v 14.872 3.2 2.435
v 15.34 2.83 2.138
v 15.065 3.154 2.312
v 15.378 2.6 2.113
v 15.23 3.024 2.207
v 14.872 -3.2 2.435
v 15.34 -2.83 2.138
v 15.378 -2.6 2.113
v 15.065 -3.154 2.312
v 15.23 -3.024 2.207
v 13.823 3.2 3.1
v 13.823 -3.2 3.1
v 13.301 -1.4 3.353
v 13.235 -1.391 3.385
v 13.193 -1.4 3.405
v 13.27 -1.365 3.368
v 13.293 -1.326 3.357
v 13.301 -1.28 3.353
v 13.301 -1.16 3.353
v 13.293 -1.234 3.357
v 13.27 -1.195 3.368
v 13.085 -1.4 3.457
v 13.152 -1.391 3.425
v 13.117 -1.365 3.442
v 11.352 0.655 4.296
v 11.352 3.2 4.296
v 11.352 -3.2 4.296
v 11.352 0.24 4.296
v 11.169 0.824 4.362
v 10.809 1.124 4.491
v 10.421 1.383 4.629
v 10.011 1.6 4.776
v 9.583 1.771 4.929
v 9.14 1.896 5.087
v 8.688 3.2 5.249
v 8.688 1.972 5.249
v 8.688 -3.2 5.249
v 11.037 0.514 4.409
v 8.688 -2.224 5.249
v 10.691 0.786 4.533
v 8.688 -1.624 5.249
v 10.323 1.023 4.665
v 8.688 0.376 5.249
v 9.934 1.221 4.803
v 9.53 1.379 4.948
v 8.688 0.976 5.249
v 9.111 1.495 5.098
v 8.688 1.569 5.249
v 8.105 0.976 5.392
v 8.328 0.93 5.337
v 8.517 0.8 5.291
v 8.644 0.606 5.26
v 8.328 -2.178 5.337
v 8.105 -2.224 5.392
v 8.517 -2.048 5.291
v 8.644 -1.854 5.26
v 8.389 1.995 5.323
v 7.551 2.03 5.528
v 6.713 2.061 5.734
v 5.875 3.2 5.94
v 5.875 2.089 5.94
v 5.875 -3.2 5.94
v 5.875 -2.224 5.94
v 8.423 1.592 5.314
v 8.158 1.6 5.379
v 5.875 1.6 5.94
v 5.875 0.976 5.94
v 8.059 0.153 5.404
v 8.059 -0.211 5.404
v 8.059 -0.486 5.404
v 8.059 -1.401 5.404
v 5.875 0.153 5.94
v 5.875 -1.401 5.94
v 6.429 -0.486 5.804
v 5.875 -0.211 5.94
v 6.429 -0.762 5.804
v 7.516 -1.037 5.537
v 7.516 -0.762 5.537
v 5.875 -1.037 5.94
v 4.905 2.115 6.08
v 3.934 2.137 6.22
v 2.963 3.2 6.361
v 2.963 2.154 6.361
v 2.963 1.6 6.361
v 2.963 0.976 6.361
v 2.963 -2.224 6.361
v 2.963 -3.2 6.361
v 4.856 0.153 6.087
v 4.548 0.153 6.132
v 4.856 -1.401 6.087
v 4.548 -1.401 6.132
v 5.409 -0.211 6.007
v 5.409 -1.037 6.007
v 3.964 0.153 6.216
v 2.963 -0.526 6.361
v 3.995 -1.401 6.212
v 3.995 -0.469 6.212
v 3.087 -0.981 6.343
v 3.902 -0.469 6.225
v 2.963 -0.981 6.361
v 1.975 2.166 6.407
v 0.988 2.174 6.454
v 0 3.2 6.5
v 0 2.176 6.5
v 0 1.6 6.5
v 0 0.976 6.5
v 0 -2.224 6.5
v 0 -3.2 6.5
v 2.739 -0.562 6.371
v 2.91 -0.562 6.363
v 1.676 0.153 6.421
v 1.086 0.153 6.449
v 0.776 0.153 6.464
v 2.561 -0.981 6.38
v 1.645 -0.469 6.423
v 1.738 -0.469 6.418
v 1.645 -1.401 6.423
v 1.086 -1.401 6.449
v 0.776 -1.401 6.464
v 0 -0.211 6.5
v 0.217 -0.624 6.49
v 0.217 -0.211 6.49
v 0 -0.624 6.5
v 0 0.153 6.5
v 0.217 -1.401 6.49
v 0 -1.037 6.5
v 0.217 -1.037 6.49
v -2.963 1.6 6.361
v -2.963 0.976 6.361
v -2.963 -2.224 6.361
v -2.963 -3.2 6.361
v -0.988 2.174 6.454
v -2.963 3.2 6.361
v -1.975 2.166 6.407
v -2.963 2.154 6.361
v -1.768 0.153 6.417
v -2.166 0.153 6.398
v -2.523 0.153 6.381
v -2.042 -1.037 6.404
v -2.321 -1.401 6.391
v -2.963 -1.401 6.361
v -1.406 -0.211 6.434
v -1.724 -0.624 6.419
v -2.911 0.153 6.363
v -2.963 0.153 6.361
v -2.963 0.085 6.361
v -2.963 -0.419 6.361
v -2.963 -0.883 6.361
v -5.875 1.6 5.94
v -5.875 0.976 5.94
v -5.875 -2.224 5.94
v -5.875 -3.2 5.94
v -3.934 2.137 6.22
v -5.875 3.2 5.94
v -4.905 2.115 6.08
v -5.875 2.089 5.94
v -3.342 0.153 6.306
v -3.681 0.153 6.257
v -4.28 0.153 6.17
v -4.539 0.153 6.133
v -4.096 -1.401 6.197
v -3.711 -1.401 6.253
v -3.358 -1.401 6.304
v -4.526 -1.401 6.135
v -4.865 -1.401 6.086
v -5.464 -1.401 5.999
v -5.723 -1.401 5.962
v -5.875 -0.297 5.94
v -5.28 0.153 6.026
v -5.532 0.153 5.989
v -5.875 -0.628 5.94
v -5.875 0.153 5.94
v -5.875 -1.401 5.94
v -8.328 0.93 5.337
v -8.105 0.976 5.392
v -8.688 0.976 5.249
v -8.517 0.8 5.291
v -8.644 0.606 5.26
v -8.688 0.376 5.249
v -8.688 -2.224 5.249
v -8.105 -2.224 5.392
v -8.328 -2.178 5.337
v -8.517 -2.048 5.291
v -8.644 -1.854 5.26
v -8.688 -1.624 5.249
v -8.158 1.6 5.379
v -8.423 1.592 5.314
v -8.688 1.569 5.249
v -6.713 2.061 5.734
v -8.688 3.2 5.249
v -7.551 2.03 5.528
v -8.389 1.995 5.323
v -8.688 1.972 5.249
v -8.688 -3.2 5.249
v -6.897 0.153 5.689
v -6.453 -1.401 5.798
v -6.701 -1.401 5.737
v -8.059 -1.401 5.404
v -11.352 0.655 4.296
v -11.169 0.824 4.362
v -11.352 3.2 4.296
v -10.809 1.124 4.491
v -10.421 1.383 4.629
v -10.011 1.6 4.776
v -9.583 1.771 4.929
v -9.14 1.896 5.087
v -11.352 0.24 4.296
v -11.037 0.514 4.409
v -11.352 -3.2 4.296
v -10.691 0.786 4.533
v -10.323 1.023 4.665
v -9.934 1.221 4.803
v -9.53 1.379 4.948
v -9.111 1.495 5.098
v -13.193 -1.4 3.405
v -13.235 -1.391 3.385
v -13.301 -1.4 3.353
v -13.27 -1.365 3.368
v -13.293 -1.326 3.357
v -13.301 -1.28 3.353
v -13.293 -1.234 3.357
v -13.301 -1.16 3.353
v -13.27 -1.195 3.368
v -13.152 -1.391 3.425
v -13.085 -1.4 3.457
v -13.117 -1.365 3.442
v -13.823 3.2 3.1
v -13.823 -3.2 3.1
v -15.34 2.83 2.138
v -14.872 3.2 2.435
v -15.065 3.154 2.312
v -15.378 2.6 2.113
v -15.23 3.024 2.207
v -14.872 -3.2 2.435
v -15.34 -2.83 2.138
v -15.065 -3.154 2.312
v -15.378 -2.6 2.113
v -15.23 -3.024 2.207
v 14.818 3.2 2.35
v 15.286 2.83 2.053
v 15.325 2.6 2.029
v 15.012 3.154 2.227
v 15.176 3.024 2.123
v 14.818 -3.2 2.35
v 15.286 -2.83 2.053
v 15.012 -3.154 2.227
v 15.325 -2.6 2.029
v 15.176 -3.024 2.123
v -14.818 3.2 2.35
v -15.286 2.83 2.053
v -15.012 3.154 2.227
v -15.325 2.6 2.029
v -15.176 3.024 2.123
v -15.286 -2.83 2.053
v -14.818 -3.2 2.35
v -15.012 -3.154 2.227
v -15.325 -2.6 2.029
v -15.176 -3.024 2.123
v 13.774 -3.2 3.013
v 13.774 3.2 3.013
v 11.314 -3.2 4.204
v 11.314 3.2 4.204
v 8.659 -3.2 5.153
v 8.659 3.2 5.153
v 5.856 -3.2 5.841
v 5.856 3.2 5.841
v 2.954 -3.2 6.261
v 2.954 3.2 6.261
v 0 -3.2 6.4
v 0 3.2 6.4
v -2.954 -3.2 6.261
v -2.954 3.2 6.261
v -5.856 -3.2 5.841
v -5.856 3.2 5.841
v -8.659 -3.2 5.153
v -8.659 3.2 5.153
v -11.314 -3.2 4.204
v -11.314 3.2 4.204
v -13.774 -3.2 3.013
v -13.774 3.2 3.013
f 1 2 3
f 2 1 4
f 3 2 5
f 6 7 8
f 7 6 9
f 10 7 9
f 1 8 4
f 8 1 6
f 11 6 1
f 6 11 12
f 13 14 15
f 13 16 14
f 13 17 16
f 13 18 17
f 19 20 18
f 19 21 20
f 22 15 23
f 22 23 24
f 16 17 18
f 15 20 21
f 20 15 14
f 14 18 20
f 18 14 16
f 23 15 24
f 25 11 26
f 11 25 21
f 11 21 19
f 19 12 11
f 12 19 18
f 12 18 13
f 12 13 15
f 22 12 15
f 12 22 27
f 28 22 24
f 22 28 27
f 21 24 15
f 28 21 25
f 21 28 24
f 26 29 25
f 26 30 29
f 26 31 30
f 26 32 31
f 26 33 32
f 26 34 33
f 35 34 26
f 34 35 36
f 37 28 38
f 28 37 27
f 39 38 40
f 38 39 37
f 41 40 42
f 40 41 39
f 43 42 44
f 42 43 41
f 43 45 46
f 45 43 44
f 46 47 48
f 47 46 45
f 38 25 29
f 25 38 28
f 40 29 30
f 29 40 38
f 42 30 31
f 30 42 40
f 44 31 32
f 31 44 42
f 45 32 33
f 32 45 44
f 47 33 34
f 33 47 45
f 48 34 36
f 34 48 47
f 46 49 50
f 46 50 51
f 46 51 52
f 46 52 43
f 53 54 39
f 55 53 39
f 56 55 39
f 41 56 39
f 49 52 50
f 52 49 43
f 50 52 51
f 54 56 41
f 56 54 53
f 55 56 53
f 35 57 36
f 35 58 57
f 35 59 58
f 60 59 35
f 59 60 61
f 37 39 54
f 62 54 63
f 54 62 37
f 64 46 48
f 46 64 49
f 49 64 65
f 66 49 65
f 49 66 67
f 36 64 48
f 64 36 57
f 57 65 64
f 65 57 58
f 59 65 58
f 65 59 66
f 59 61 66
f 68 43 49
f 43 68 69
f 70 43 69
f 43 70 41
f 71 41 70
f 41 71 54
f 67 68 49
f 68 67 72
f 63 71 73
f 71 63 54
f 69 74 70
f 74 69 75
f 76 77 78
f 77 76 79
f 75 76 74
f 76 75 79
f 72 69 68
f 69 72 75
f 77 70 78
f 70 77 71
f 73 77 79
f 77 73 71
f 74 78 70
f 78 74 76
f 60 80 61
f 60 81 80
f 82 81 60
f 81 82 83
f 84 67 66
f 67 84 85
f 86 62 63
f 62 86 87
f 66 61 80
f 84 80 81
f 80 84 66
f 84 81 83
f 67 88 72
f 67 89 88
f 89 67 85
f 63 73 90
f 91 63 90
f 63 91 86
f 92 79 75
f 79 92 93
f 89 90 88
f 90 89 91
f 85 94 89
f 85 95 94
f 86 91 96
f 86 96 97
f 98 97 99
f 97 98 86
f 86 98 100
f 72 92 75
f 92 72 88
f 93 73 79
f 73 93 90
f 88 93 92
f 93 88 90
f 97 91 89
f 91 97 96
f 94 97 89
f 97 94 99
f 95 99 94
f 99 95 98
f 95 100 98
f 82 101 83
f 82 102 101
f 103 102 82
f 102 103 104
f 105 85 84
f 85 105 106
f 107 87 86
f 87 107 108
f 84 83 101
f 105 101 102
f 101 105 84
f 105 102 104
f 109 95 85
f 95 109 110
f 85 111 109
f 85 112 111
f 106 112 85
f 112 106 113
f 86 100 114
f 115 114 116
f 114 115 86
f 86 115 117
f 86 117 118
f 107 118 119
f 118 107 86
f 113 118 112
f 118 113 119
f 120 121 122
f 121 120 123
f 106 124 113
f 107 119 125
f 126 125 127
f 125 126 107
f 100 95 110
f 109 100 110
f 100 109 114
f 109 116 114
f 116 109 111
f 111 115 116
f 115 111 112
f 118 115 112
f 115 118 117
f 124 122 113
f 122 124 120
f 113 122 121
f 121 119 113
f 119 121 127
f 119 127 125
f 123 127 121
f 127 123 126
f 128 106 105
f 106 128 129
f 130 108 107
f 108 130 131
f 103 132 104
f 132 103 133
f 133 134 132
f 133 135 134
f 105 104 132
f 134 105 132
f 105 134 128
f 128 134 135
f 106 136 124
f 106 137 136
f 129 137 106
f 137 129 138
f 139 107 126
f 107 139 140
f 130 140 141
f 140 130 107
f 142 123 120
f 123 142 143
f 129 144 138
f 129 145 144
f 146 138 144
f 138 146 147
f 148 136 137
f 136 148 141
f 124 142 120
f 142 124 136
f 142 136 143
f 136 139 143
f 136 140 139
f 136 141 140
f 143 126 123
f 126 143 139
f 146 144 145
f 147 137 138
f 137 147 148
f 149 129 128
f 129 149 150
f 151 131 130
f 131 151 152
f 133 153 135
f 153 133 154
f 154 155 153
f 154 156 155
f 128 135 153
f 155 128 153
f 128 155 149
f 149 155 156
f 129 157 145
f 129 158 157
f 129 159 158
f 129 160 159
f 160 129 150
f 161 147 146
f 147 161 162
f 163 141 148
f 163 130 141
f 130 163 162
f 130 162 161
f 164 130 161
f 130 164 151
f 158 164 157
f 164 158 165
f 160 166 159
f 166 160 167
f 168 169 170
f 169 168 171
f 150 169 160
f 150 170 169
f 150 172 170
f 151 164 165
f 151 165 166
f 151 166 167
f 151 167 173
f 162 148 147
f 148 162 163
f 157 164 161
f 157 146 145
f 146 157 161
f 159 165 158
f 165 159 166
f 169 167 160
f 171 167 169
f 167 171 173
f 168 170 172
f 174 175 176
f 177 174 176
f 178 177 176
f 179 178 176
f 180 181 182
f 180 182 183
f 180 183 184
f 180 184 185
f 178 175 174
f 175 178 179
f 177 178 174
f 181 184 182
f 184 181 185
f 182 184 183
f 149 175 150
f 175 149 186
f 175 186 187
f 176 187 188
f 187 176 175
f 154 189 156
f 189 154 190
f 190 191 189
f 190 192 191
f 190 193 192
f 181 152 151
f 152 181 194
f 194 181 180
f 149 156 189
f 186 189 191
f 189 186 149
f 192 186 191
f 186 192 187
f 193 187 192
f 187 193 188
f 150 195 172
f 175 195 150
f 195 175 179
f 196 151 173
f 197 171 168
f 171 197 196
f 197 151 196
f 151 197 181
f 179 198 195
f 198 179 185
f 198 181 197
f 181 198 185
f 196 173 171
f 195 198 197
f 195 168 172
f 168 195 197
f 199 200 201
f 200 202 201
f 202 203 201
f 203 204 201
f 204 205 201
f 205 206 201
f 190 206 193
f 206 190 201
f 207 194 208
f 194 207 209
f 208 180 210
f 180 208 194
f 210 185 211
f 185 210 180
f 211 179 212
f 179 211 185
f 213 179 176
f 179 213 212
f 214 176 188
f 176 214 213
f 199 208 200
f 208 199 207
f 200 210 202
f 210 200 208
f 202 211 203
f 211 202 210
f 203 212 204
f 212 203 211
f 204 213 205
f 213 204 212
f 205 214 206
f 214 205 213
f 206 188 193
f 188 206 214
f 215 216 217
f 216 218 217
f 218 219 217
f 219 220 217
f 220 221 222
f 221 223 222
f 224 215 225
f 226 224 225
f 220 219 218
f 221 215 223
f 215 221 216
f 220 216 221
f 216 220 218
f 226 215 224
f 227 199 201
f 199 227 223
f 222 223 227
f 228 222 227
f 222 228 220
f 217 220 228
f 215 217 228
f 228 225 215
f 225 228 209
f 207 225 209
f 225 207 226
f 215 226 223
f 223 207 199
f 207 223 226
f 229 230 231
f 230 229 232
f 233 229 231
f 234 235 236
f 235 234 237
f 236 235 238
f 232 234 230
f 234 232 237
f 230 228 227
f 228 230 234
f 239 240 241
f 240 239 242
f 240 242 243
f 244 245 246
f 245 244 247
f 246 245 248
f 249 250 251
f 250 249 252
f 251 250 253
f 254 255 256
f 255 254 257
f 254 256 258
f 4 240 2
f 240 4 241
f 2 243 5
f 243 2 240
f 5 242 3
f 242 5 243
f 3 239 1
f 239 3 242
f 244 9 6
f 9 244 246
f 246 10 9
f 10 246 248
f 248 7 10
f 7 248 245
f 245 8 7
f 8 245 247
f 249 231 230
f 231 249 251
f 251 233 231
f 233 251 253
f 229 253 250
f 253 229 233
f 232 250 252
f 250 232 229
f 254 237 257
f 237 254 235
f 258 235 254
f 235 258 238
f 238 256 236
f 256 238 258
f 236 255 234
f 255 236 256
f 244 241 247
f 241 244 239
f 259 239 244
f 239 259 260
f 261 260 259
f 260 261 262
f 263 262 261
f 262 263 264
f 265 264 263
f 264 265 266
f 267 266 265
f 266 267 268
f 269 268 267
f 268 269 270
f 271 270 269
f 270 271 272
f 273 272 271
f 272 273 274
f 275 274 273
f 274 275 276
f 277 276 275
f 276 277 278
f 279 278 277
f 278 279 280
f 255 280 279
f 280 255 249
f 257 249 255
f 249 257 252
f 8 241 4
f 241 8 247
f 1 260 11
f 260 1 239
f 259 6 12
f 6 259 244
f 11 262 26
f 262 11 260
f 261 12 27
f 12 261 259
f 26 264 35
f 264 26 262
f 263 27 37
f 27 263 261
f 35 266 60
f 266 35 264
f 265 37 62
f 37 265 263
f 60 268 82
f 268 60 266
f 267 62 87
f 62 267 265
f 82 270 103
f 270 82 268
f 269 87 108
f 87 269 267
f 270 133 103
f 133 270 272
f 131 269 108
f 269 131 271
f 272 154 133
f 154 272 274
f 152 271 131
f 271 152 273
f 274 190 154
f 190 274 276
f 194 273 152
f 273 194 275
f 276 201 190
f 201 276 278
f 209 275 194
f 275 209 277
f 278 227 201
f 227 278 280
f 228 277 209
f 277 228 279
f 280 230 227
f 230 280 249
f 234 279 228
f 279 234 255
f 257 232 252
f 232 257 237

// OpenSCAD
use <../lib.scad>
use <s/6177741es01.scad>
use <s/6177741es02.scad>
use <s/6177741es03.scad>
use <s/6177741es04.scad>
use <s/6177741es05.scad>
use <s/6177741es06.scad>
use <s/6177741es07.scad>
use <s/6177741es08.scad>
use <s/6177741es09.scad>
use <s/6177741es11.scad>
function ldraw_lib__6177741ec01() = [
// 0 Sticker  0.8 x  4.1 with White "AMG" in Black Frame on Transparent Background (Formed)
// 0 Name: 6177741ec01.dat
// 0 Author: Massimo Maso [Sirio]
// 0 !LDRAW_ORG Part UPDATE 2025-05
// 0 !LICENSE Licensed under CC BY 4.0 : see CAreadme.txt
// 
// 0 BFC CERTIFY CCW
  [0,"BFC","CERTIFY"],
  [0,"BFC","CCW"],
// 
// 0 !KEYWORDS GT3, Mercedes, Set 75877, Speed Champions
// 
// 0 !HISTORY 2025-05-28 [OrionP] Official Update 2025-05
// 
// 
// 1 16 34.436 -7.5317 0 0 -.5359 .844281 0 .844281 .5359 -1 0 0 s\6177741es01.dat
  [1,16,34.436,-7.5317,0,0,-.5359,.844281,0,.844281,.5359,-1,0,0, ldraw_lib__s__6177741es01()],
// 1 16 34.436 -7.5317 0 0 -.435742 .900072 0 .900072 .435742 -1 0 0 s\6177741es02.dat
  [1,16,34.436,-7.5317,0,0,-.435742,.900072,0,.900072,.435742,-1,0,0, ldraw_lib__s__6177741es02()],
// 1 16 21.648 -12.8828 0 0 -.336689 .941616 0 .941616 .336689 -1 0 0 s\6177741es03.dat
  [1,16,21.648,-12.8828,0,0,-.336689,.941616,0,.941616,.336689,-1,0,0, ldraw_lib__s__6177741es03()],
// 1 16 21.648 -12.8828 0 0 -.238478 .971148 0 .971148 .238478 -1 0 0 s\6177741es04.dat
  [1,16,21.648,-12.8828,0,0,-.238478,.971148,0,.971148,.238478,-1,0,0, ldraw_lib__s__6177741es04()],
// 1 16 7.384 -15.6525 0 0 -.143056 .989715 0 .989715 .143056 -1 0 0 s\6177741es05.dat
  [1,16,7.384,-15.6525,0,0,-.143056,.989715,0,.989715,.143056,-1,0,0, ldraw_lib__s__6177741es05()],
// 1 16 7.384 -15.6525 0 0 -.047009 .998894 0 .998894 .047009 -1 0 0 s\6177741es06.dat
  [1,16,7.384,-15.6525,0,0,-.047009,.998894,0,.998894,.047009,-1,0,0, ldraw_lib__s__6177741es06()],
// 1 16 -7.384 -15.6525 0 0 .047009 .998894 0 .998894 -.047009 -1 0 0 s\6177741es07.dat
  [1,16,-7.384,-15.6525,0,0,.047009,.998894,0,.998894,-.047009,-1,0,0, ldraw_lib__s__6177741es07()],
// 1 16 -7.384 -15.6525 0 0 .143056 .989715 0 .989715 -.143056 -1 0 0 s\6177741es08.dat
  [1,16,-7.384,-15.6525,0,0,.143056,.989715,0,.989715,-.143056,-1,0,0, ldraw_lib__s__6177741es08()],
// 1 16 -21.648 -12.8828 0 0 .238478 .971148 0 .971148 -.238478 -1 0 0 s\6177741es09.dat
  [1,16,-21.648,-12.8828,0,0,.238478,.971148,0,.971148,-.238478,-1,0,0, ldraw_lib__s__6177741es09()],
// 1 16 -21.648 -12.8828 0 0 .336689 -.941616 0 .941616 .336689 -1 0 0 s\6177741es03.dat
  [1,16,-21.648,-12.8828,0,0,.336689,-.941616,0,.941616,.336689,-1,0,0, ldraw_lib__s__6177741es03()],
// 1 16 -34.436 -7.5317 0 0 .435742 -.900072 0 .900072 .435742 -1 0 0 s\6177741es02.dat
  [1,16,-34.436,-7.5317,0,0,.435742,-.900072,0,.900072,.435742,-1,0,0, ldraw_lib__s__6177741es02()],
// 1 16 -34.436 -7.5317 0 0 .5359 -.844281 0 .844281 .5359 -1 0 0 s\6177741es01.dat
  [1,16,-34.436,-7.5317,0,0,.5359,-.844281,0,.844281,.5359,-1,0,0, ldraw_lib__s__6177741es01()],
// 1 16 0 0 0 0 0 1 0 1 0 -1 0 0 s\6177741es11.dat
  [1,16,0,0,0,0,0,1,0,1,0,-1,0,0, ldraw_lib__s__6177741es11()],
];
module ldraw_lib__6177741ec01(step=0, col=false, unit=2/5, alt=false, line=0.2, solid=!$preview)
    makepoly(ldraw_lib__6177741ec01(), step=step, col=col, unit=unit, alt=alt, line=line, solid=solid);
ldraw_lib__6177741ec01(line=0.2);
